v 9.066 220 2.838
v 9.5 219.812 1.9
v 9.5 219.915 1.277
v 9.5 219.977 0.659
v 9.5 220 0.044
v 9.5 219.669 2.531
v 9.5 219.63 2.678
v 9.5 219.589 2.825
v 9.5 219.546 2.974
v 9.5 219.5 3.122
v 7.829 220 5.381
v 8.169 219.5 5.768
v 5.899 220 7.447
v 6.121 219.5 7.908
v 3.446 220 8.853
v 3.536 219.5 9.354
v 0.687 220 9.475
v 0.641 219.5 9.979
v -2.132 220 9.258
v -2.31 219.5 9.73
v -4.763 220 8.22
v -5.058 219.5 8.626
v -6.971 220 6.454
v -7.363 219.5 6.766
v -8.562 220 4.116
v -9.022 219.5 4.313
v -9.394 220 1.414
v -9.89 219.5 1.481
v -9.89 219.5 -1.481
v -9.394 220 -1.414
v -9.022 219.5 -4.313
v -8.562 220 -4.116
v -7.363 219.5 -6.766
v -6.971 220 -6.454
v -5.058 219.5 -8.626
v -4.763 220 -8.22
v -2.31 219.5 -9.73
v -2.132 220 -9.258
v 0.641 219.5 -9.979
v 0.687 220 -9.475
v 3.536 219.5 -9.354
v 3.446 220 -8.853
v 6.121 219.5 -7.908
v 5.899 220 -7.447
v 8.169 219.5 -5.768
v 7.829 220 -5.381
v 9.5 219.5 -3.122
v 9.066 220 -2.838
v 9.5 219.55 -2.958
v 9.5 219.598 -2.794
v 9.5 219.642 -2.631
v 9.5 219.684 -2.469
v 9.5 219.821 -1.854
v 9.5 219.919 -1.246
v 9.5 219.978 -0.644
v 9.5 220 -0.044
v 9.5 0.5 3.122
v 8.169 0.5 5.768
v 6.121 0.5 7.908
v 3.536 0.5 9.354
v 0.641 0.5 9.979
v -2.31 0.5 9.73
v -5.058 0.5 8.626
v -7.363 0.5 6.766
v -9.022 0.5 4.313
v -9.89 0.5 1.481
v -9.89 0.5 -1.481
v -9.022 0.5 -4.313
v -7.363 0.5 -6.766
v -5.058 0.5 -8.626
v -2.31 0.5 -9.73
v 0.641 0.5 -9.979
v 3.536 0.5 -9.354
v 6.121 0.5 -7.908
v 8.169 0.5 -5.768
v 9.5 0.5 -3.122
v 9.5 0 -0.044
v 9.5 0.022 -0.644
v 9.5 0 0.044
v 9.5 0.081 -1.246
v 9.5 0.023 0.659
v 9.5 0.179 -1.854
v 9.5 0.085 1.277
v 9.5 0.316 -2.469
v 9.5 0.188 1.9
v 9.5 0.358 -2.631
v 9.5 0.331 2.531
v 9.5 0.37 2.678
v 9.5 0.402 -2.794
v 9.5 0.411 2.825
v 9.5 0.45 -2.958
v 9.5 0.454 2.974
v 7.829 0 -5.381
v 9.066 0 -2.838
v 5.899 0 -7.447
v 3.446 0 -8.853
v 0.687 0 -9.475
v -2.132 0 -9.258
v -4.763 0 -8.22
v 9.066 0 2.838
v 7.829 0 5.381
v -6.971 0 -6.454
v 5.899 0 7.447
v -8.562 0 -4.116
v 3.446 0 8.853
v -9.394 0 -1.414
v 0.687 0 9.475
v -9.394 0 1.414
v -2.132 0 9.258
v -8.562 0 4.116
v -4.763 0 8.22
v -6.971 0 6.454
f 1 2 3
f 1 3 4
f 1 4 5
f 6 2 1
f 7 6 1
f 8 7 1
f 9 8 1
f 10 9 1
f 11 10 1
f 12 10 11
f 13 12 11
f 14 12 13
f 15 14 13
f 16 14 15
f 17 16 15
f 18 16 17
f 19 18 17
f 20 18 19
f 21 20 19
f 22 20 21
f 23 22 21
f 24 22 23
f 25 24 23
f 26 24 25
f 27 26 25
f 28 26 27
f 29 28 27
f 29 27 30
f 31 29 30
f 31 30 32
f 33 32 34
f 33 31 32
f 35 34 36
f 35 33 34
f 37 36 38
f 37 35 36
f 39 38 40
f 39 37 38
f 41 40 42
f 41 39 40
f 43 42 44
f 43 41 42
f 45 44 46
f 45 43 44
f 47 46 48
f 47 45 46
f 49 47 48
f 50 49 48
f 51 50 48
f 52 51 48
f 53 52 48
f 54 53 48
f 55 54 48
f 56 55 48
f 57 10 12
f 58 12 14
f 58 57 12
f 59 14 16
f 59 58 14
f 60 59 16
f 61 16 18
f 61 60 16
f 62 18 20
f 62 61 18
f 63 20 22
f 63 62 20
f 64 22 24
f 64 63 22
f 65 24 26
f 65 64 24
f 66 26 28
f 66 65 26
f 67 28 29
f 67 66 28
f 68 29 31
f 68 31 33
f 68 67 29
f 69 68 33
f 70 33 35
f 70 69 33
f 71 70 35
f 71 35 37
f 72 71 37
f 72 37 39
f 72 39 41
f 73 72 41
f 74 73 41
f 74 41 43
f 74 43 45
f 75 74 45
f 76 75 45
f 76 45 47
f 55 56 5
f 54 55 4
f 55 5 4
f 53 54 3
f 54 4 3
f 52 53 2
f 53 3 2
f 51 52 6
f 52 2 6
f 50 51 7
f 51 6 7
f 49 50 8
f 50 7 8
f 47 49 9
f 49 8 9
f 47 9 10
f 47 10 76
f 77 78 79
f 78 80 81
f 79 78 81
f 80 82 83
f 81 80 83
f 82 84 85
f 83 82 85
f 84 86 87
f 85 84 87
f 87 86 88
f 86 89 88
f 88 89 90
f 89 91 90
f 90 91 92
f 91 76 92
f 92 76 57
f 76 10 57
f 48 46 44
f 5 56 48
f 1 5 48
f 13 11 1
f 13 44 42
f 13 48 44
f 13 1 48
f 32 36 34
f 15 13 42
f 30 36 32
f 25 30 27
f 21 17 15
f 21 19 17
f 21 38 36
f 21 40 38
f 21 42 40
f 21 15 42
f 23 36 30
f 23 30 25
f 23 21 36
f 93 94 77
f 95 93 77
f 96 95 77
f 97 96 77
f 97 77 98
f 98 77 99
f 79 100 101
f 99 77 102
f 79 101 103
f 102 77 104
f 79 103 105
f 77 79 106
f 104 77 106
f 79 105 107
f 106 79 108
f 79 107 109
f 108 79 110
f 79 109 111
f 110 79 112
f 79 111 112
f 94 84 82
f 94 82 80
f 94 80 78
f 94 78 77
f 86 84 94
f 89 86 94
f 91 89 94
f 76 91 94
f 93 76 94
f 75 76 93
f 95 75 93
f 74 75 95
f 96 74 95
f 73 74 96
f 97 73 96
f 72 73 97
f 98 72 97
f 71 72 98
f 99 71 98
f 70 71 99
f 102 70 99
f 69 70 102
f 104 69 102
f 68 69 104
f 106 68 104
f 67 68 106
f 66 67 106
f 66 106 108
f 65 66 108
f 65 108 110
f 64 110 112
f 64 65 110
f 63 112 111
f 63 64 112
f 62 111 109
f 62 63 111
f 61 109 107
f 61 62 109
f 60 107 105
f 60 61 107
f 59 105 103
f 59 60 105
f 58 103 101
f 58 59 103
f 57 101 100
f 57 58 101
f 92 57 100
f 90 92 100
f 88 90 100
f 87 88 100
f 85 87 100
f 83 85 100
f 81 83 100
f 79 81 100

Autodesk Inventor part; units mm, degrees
ref_plane "XZ Plane" through (0, 0, 0) normal (0, 1, 0) x (-1, 0, 0)
ref_plane "XY Plane" through (0, 0, 0) normal (0, 0, 1) x (1, 0, 0)
sketch "Sketch1" plane through (0, 0, 0) normal (0, 1, 0) x (-1, 0, 0)
  circle A0 centre (0, 0) radius 10
  dimension "d0" = 20
extrude "Extrusion1" add sketch "Sketch1" along normal blind 220
ref_plane "Work Plane1" through (10, 0, 0) normal (1, 0, 0) x (0, 1, 0)
sketch "Sketch2" plane through (10, 0, 0) normal (1, 0, 0) x (0, 1, 0)
  line L0 (220, -10) -> (220, 10) projected
  line L1 (0, -10) -> (0, 10) projected
  line L2 (0, 0) -> (132.5, 0)
  circle A0 centre (132.5, 0) radius 1.25
  circle A1 centre (132.5, 0) radius 0.5
  circle A2 centre (132.5, 0.0309) radius 2.5
  line L3 (0, -10) -> (0, 10) projected
  line L4 (132.5, -2.4691) -> (0, -2.4691)
  line L5 (0, -2.4691) -> (0, 2.5309)
  line L6 (0, 2.5309) -> (132.5, 2.5309)
  line L7 (132.5, 2.5309) -> (132.5, -2.4691)
  line L8 (220, -10) -> (220, 10) projected
  line L9 (132.5, -2.4691) -> (220, -2.4691)
  line L10 (220, -2.4691) -> (220, 2.5309)
  line L11 (220, 2.5309) -> (132.5, 2.5309)
  line L12 (132.5, 2.5309) -> (132.5, -2.4691)
  dimension "d21" = 5
  dimension "d3" = 132.5
  dimension "d4" = 2.5
  dimension "d5" = 1
extrude "Extrusion2" cut sketch "Sketch2" against normal blind 0.5
sketch "Sketch3" plane through (9.5, 0, 0) normal (1, 0, 0) x (0, 0, -1)
  line L0 (2.4691, 0) -> (-2.5309, 0) projected
  circle A0 centre (-0.0309, 132.5) radius 0.75
  circle A1 centre (-0.0309, 132.5) radius 1.25
  line L1 (2.4691, 220) -> (2.4691, 0) projected
  line L2 (-2.5309, 220) -> (2.4691, 220) projected
  line L3 (-2.5309, 0) -> (-2.5309, 220) projected
  point P0 (0, 0)
  dimension "d24" = 1.5
  dimension "d25" = 2.5
extrude "Extrusion4" [suppressed]
chamfer "Chamfer5" [suppressed]
chamfer "Chamfer6" distance 0.5 angle 45 2 edges at (-9.9999, 220, -0.0319) (-9.9999, 0, -0.0319)
sketch "Sketch4" plane through (9.5, 0.3156, -2.4691) normal (0, 0, 1) x (1, 0, 0)
  spline S0 degree 2 poles (0.1904, 0.1843) (0.0943, 0.0912) (0, -0.0001) knots 0 0 0 1 1 1 weights 1 1.000046 1 projected
  line L0 (0.1904, 219.1844) -> (0.1904, 0.1844) projected
  spline S1 degree 4 poles (0, 219.3688) (0.0476, 219.3228) (0.0952, 219.2767) (0.1428, 219.2306) (0.1904, 219.1845) knots 0 0 0 0 0 1 1 1 1 1 projected
  line L1 (0, 219.3687) -> (0, 0) projected
  point P0 (-9.5, -0.3156)
extrude "Extrusion5" cut sketch "Sketch4" against normal blind 10
sketch "Sketch5" plane through (9.5, 0.3313, 2.5309) normal (0, 0, -1) x (-1, 0, 0)
  spline S0 degree 2 poles (0, -0.0001) (-0.0865, 0.0835) (-0.1744, 0.1686) knots 0 0 0 1 1 1 weights 1 1.000039 1 projected
  line L0 (0, 0) -> (0, 219.3373) projected
  spline S1 degree 2 poles (-0.1744, 219.1688) (-0.0865, 219.2539) (0, 219.3374) knots 0 0 0 1 1 1 weights 1 1.000039 1 projected
  line L1 (-0.1744, 0.1687) -> (-0.1744, 219.1687) projected
  point P0 (9.5, -0.3313)
extrude "Extrusion6" cut sketch "Sketch5" against normal blind 10
properties part number "wał_półkola" material "Stainless Steel"
